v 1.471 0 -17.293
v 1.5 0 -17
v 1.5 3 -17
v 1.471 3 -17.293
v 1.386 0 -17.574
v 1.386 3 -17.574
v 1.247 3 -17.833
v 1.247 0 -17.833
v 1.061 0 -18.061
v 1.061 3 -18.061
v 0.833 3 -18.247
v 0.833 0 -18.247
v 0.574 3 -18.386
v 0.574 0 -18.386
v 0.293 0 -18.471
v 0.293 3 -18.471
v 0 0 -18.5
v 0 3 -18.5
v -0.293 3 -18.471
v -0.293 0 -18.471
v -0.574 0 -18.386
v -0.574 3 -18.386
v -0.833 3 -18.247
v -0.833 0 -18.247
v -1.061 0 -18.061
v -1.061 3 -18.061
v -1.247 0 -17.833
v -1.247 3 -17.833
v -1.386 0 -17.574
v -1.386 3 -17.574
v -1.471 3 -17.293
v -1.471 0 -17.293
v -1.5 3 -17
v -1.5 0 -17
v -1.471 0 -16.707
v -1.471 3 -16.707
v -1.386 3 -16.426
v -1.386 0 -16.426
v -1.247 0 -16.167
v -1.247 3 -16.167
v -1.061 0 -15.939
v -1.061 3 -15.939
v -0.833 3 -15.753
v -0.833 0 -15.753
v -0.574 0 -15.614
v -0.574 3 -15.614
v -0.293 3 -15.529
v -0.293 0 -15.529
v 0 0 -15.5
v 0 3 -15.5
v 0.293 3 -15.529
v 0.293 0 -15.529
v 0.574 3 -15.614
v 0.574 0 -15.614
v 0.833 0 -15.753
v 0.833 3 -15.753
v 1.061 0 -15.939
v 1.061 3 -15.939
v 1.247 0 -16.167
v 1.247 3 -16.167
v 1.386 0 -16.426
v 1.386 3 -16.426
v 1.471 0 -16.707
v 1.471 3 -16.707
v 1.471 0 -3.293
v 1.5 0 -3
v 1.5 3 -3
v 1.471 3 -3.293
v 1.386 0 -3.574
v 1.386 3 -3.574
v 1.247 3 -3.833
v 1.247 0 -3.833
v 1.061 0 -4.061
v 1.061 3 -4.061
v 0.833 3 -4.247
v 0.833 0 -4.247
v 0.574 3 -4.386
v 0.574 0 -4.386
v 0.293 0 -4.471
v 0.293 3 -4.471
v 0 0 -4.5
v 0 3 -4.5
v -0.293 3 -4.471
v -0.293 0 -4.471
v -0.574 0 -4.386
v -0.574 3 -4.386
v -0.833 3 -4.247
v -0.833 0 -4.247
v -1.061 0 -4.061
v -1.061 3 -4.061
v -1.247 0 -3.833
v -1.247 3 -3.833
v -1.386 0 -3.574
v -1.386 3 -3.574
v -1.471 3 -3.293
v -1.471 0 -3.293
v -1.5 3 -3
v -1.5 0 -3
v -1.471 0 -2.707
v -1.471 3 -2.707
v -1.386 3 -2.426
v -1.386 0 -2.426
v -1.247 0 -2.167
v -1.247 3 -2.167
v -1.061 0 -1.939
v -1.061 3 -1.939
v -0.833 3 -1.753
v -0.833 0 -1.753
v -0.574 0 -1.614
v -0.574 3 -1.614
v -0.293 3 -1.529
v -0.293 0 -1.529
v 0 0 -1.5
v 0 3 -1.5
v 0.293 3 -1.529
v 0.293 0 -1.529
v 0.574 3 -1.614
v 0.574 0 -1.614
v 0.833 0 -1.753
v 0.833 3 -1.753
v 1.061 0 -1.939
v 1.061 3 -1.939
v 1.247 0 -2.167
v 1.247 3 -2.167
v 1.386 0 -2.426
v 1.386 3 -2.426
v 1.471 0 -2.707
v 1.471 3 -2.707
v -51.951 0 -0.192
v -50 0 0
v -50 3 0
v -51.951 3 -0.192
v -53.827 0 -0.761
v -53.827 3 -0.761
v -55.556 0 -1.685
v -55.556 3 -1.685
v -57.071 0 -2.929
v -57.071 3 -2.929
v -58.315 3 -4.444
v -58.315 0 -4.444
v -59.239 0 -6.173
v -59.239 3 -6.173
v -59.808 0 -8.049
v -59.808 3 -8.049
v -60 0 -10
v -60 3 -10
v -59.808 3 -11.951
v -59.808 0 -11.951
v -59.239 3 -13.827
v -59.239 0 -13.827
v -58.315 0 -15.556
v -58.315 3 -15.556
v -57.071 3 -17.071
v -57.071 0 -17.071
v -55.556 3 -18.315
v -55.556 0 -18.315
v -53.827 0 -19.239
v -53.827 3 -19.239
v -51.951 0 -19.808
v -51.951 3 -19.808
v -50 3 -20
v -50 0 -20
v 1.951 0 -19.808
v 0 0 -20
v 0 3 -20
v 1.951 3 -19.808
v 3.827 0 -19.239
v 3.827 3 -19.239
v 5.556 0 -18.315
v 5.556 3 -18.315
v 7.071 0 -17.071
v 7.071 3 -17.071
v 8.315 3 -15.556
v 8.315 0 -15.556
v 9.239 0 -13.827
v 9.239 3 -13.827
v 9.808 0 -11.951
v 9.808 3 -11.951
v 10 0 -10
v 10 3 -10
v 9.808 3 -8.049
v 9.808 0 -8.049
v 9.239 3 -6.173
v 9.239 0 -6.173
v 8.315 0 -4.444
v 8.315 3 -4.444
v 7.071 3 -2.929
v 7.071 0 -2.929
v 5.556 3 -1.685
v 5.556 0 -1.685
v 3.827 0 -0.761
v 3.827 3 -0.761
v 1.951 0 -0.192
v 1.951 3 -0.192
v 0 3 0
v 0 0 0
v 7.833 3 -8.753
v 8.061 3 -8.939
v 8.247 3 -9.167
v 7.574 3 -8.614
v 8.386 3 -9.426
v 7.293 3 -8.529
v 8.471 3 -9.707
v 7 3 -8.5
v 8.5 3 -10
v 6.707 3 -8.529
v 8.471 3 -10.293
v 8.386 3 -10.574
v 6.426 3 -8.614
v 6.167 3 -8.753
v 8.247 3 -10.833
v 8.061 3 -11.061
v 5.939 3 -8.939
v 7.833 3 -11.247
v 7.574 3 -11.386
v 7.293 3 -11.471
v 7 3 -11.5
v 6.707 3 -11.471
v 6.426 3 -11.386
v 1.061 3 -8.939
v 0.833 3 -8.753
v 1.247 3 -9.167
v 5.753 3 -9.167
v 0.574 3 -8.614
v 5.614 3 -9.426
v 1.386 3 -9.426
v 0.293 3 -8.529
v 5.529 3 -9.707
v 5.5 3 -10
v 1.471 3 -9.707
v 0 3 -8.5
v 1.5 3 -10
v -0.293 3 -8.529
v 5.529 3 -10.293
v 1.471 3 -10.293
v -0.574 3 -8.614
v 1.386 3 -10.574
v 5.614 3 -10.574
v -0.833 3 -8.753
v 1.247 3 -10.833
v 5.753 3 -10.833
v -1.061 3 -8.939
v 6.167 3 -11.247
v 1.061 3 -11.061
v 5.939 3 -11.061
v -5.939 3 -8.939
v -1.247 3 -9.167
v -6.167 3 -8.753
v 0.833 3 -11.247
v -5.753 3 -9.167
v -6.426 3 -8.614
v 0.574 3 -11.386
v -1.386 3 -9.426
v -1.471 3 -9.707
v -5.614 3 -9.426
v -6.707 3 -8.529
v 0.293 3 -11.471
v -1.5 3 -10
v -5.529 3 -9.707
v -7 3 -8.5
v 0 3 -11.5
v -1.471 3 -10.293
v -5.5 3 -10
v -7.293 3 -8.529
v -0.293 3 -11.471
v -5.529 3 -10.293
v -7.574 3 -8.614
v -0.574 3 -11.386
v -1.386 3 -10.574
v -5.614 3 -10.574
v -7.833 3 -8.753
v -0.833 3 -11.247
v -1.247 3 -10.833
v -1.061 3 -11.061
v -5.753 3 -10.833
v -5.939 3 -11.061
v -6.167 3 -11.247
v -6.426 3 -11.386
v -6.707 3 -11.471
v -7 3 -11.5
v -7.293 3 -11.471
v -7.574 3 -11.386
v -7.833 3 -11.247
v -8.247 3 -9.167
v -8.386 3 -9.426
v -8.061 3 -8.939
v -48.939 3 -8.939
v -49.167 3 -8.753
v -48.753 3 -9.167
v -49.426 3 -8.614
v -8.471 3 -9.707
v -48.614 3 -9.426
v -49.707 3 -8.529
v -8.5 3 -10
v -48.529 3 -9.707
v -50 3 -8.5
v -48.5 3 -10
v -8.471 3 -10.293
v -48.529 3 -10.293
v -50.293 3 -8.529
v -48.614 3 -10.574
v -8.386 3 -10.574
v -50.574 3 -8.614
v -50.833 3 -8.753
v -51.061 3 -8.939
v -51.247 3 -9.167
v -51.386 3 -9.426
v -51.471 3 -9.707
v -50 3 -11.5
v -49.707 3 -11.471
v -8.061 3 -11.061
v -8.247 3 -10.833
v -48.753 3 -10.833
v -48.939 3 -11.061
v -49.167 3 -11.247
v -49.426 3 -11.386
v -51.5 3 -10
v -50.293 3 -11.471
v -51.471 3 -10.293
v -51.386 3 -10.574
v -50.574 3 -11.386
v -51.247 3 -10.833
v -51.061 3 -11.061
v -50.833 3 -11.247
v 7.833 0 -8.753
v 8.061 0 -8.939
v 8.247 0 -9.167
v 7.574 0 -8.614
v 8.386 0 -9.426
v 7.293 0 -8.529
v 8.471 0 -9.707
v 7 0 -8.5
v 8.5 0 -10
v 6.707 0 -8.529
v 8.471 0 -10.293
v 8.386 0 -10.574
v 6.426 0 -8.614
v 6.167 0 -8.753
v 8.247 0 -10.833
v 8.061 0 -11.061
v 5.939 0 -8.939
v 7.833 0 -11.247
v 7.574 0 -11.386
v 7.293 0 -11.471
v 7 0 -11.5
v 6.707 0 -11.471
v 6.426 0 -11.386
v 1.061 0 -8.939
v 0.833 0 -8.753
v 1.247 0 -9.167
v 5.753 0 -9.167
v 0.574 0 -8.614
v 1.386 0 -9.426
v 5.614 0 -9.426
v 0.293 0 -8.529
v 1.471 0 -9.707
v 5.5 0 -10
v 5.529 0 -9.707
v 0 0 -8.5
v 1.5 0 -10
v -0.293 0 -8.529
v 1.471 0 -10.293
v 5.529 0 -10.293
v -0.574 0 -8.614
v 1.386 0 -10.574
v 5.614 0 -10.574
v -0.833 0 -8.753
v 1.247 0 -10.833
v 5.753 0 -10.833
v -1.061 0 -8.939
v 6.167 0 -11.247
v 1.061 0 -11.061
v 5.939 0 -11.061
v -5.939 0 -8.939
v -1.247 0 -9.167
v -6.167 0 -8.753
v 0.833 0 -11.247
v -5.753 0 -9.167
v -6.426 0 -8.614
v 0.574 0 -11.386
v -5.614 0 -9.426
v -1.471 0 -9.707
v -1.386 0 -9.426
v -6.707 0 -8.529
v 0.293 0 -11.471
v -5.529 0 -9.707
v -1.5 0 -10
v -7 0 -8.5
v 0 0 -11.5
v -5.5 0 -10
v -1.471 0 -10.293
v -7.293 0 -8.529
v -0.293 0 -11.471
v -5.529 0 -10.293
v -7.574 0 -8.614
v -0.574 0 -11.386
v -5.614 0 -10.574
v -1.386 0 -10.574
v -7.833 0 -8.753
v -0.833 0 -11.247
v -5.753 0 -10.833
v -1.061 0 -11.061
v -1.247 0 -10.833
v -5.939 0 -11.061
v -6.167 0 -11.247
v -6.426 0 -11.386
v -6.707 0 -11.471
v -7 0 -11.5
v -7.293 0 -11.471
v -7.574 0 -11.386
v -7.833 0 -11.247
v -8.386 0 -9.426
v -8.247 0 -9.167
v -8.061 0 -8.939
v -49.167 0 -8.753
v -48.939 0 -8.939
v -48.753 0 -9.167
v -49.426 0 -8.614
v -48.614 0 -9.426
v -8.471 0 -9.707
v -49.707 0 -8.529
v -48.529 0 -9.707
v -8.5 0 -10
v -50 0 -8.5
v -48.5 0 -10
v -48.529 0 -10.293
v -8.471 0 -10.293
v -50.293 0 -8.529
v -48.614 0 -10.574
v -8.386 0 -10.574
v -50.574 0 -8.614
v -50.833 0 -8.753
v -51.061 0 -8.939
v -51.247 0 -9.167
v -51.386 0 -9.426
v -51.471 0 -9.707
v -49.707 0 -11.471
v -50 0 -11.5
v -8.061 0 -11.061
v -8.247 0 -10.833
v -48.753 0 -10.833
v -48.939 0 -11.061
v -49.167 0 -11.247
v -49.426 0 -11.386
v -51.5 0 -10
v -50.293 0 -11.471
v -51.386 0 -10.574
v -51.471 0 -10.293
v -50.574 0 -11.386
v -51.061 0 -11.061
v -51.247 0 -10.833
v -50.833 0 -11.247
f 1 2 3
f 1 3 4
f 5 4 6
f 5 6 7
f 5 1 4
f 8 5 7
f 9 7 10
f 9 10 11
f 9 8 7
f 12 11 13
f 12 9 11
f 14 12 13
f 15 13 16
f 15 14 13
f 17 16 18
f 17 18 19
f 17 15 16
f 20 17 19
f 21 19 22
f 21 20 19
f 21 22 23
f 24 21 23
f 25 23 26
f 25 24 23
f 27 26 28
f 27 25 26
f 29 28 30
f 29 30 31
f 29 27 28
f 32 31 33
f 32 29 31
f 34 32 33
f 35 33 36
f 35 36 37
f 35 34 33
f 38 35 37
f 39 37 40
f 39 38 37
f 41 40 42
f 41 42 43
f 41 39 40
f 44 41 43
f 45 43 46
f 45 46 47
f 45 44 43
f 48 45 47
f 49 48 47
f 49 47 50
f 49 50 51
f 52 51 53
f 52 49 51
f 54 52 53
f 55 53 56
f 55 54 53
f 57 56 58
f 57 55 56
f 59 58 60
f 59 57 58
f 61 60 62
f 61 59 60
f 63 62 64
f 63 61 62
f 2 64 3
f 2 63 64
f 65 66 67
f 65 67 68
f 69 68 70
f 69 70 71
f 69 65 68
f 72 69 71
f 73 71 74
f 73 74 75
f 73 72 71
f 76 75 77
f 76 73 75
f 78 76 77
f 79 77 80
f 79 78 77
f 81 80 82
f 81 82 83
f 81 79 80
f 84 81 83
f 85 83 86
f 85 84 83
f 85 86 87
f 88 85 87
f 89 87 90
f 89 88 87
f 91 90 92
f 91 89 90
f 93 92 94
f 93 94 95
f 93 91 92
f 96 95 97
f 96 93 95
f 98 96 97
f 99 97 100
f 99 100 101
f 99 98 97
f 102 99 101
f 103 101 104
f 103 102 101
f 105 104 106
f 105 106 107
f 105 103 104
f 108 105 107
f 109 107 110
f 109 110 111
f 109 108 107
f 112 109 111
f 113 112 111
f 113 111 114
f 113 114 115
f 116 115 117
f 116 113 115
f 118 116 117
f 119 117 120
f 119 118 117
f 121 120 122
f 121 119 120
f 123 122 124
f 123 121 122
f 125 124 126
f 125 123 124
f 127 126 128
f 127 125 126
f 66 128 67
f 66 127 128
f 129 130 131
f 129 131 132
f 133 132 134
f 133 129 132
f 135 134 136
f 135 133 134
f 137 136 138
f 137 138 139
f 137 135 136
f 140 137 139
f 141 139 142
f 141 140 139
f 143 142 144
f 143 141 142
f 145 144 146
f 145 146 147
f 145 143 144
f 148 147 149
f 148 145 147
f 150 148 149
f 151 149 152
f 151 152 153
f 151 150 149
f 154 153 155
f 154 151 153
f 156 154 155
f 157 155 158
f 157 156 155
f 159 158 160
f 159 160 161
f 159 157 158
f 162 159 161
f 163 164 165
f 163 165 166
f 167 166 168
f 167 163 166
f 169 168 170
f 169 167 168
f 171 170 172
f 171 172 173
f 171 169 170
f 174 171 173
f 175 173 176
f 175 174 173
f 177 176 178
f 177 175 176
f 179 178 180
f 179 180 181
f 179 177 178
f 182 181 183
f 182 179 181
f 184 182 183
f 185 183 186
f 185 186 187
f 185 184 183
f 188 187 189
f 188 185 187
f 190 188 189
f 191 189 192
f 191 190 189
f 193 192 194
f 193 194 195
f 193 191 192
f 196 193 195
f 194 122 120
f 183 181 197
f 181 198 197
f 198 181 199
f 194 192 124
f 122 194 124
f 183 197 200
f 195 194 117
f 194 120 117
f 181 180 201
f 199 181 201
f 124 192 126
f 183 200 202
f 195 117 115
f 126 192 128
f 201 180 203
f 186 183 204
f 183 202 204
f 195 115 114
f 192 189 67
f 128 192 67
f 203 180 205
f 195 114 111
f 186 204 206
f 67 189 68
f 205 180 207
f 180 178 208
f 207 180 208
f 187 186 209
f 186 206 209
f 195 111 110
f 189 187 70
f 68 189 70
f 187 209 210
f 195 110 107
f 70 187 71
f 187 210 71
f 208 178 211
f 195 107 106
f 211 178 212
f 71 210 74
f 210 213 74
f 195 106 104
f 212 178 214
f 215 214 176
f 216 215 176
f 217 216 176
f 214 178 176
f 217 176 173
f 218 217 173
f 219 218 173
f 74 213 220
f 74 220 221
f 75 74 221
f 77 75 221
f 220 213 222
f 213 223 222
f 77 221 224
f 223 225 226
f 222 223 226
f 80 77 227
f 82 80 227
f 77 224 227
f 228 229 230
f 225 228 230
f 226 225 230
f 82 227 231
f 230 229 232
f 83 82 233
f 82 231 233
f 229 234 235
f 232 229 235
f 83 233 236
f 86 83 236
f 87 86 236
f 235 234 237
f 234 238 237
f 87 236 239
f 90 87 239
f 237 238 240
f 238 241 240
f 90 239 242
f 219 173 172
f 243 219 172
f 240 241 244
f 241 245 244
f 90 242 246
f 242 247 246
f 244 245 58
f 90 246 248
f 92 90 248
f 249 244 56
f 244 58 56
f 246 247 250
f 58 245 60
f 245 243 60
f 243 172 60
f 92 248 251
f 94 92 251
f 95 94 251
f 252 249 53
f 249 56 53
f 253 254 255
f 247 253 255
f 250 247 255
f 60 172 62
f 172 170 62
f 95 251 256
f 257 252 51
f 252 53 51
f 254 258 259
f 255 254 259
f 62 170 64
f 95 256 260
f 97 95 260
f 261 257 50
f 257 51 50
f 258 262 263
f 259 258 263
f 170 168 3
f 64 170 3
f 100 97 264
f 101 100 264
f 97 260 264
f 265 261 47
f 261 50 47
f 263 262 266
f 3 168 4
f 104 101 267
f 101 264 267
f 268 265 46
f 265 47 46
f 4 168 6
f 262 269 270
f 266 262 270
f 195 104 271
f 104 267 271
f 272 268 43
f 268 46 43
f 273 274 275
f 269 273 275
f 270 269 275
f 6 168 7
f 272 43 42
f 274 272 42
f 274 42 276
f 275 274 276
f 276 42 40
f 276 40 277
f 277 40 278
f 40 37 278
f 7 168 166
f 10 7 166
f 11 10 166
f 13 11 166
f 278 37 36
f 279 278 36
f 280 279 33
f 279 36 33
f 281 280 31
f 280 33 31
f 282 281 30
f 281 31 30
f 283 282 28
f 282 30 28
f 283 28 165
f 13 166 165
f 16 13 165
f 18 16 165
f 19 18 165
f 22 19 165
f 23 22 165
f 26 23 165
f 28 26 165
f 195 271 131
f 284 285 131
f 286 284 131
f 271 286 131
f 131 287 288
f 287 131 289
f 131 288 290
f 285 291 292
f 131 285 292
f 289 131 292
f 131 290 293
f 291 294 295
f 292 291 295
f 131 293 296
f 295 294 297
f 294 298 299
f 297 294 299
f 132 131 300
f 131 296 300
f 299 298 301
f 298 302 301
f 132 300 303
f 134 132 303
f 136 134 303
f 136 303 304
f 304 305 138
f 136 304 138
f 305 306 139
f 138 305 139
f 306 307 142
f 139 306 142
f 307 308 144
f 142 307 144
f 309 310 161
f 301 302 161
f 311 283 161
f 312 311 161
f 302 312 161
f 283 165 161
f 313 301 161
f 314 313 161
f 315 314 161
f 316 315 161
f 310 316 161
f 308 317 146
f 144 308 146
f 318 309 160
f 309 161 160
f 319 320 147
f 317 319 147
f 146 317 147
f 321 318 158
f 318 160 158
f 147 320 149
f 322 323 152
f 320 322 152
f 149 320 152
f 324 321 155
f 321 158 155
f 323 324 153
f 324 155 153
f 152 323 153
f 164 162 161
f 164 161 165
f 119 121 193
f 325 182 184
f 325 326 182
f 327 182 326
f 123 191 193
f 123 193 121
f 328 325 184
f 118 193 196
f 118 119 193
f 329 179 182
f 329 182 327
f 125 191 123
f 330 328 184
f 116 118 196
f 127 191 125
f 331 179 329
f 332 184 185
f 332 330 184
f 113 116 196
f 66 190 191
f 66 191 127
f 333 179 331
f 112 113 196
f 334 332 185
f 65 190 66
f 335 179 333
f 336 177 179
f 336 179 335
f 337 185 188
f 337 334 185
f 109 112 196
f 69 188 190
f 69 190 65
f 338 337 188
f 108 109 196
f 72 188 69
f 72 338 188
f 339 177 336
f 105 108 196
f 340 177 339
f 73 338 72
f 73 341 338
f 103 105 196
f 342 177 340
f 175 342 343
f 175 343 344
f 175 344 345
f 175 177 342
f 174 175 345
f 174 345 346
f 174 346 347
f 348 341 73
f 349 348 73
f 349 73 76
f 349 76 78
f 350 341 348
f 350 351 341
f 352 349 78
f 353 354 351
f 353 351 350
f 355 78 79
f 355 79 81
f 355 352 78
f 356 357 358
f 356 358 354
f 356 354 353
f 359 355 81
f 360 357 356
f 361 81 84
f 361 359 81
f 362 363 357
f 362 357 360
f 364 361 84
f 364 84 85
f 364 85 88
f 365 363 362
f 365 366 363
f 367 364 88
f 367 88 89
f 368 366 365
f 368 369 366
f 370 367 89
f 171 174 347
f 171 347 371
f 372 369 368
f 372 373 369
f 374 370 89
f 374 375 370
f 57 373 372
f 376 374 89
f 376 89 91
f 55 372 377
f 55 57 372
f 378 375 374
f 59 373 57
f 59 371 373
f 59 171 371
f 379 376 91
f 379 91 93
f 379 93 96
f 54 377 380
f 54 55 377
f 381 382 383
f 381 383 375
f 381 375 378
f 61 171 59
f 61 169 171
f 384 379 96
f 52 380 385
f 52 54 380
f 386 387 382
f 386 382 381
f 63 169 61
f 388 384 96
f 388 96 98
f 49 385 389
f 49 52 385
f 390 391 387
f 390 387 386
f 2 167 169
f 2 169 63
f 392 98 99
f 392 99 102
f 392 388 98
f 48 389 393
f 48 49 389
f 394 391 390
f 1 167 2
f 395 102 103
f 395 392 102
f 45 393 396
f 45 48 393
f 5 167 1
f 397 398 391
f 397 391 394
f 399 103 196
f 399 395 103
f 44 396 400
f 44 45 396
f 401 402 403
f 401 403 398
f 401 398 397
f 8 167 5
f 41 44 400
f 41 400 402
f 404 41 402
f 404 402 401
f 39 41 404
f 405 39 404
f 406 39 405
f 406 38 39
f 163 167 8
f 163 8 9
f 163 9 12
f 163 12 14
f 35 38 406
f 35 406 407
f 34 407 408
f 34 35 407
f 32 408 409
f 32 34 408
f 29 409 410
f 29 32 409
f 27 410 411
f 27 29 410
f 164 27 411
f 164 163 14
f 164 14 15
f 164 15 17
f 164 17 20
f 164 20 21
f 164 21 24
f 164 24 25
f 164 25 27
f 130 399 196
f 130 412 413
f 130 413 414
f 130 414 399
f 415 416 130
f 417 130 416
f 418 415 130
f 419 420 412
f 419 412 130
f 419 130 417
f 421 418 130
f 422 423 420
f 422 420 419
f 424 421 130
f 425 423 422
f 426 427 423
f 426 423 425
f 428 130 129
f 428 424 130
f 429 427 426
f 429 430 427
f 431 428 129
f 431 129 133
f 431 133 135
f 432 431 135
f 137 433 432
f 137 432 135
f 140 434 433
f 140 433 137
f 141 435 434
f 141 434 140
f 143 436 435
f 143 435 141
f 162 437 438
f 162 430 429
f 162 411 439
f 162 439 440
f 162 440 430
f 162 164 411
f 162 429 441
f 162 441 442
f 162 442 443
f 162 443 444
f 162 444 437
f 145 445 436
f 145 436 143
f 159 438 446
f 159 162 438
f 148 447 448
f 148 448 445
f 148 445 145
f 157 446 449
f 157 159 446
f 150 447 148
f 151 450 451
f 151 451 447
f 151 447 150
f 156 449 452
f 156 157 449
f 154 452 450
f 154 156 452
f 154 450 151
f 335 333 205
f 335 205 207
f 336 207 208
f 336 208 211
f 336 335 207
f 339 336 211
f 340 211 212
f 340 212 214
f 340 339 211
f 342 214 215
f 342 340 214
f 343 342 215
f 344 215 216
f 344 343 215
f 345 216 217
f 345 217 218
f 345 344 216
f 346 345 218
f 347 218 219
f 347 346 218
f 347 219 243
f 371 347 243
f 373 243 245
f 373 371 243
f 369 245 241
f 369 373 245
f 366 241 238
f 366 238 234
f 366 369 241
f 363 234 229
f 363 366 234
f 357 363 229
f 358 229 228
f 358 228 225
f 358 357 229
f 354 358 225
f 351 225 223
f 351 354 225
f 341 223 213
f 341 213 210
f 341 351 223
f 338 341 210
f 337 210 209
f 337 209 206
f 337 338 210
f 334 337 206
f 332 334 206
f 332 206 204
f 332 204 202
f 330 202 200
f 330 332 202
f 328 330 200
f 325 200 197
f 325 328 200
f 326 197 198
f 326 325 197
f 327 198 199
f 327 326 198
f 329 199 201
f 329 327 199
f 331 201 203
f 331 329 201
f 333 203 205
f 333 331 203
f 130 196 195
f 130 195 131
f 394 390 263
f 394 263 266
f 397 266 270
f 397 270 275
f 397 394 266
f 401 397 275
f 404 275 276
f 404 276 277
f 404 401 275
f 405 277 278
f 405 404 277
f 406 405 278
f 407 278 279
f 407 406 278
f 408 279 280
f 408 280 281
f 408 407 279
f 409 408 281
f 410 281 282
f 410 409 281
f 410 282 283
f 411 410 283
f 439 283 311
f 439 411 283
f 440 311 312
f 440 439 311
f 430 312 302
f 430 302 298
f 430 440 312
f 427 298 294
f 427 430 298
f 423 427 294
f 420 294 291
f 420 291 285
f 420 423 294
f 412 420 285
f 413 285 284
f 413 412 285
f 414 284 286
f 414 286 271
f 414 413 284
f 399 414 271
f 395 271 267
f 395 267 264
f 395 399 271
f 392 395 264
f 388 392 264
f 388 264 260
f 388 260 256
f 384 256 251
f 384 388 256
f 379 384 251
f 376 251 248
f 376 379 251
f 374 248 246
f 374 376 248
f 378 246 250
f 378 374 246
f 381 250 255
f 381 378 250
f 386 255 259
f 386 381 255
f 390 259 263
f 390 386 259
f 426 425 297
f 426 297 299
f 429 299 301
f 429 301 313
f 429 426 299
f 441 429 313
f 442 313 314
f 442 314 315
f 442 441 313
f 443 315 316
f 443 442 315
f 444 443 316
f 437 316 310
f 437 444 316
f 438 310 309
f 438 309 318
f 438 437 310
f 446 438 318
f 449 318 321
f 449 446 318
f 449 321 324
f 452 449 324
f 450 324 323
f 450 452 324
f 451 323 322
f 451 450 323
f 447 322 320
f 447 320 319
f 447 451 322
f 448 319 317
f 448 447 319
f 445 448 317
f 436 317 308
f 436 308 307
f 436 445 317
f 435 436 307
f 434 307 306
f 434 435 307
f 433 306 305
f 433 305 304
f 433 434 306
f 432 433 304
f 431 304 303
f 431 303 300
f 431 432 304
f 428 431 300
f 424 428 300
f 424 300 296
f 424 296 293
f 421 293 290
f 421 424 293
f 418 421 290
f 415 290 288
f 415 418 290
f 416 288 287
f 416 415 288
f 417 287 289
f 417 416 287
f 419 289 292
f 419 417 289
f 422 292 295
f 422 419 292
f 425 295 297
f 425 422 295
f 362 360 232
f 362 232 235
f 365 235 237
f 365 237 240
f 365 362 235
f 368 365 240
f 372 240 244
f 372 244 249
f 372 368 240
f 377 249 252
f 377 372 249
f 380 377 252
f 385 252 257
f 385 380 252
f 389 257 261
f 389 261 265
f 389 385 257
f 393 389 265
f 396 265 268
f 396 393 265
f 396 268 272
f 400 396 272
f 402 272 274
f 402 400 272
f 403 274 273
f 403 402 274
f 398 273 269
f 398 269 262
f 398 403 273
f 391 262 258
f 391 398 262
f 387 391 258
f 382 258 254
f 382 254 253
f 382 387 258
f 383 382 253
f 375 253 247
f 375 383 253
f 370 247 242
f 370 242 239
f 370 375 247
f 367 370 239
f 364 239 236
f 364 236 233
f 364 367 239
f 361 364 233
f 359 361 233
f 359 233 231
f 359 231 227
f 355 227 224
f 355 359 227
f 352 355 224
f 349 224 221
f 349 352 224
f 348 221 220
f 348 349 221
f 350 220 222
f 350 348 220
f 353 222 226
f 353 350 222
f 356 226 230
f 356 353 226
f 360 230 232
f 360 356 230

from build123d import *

# Parameters (mm, degrees)
SKETCH1_R           = 1.5
BOSS_EXTRUDE1_DEPTH = 3


with BuildPart() as part:
    # Sketch1 → Boss-Extrude1 (new body)
    with BuildSketch(Plane(origin=(0, 0, 0), x_dir=(1, 0, 0), z_dir=(0, 1, 0))):
        with BuildLine():
            Line((0, 0), (-50, 0))
            ThreePointArc((-50, 0), (-60, 10), (-50, 20))
            Line((-50, 20), (0, 20))
            ThreePointArc((0, 20), (10, 10), (0, 0))
        make_face()
        with Locations((0, 10)):
            Circle(SKETCH1_R, mode=Mode.SUBTRACT)
        with Locations((0, 17)):
            Circle(SKETCH1_R, mode=Mode.SUBTRACT)
        with Locations((0, 3)):
            Circle(SKETCH1_R, mode=Mode.SUBTRACT)
        with Locations((7, 10)):
            Circle(SKETCH1_R, mode=Mode.SUBTRACT)
        with Locations((-7, 10)):
            Circle(SKETCH1_R, mode=Mode.SUBTRACT)
        with Locations((-50, 10)):
            Circle(SKETCH1_R, mode=Mode.SUBTRACT)
    extrude(amount=BOSS_EXTRUDE1_DEPTH)


solid = part.part
